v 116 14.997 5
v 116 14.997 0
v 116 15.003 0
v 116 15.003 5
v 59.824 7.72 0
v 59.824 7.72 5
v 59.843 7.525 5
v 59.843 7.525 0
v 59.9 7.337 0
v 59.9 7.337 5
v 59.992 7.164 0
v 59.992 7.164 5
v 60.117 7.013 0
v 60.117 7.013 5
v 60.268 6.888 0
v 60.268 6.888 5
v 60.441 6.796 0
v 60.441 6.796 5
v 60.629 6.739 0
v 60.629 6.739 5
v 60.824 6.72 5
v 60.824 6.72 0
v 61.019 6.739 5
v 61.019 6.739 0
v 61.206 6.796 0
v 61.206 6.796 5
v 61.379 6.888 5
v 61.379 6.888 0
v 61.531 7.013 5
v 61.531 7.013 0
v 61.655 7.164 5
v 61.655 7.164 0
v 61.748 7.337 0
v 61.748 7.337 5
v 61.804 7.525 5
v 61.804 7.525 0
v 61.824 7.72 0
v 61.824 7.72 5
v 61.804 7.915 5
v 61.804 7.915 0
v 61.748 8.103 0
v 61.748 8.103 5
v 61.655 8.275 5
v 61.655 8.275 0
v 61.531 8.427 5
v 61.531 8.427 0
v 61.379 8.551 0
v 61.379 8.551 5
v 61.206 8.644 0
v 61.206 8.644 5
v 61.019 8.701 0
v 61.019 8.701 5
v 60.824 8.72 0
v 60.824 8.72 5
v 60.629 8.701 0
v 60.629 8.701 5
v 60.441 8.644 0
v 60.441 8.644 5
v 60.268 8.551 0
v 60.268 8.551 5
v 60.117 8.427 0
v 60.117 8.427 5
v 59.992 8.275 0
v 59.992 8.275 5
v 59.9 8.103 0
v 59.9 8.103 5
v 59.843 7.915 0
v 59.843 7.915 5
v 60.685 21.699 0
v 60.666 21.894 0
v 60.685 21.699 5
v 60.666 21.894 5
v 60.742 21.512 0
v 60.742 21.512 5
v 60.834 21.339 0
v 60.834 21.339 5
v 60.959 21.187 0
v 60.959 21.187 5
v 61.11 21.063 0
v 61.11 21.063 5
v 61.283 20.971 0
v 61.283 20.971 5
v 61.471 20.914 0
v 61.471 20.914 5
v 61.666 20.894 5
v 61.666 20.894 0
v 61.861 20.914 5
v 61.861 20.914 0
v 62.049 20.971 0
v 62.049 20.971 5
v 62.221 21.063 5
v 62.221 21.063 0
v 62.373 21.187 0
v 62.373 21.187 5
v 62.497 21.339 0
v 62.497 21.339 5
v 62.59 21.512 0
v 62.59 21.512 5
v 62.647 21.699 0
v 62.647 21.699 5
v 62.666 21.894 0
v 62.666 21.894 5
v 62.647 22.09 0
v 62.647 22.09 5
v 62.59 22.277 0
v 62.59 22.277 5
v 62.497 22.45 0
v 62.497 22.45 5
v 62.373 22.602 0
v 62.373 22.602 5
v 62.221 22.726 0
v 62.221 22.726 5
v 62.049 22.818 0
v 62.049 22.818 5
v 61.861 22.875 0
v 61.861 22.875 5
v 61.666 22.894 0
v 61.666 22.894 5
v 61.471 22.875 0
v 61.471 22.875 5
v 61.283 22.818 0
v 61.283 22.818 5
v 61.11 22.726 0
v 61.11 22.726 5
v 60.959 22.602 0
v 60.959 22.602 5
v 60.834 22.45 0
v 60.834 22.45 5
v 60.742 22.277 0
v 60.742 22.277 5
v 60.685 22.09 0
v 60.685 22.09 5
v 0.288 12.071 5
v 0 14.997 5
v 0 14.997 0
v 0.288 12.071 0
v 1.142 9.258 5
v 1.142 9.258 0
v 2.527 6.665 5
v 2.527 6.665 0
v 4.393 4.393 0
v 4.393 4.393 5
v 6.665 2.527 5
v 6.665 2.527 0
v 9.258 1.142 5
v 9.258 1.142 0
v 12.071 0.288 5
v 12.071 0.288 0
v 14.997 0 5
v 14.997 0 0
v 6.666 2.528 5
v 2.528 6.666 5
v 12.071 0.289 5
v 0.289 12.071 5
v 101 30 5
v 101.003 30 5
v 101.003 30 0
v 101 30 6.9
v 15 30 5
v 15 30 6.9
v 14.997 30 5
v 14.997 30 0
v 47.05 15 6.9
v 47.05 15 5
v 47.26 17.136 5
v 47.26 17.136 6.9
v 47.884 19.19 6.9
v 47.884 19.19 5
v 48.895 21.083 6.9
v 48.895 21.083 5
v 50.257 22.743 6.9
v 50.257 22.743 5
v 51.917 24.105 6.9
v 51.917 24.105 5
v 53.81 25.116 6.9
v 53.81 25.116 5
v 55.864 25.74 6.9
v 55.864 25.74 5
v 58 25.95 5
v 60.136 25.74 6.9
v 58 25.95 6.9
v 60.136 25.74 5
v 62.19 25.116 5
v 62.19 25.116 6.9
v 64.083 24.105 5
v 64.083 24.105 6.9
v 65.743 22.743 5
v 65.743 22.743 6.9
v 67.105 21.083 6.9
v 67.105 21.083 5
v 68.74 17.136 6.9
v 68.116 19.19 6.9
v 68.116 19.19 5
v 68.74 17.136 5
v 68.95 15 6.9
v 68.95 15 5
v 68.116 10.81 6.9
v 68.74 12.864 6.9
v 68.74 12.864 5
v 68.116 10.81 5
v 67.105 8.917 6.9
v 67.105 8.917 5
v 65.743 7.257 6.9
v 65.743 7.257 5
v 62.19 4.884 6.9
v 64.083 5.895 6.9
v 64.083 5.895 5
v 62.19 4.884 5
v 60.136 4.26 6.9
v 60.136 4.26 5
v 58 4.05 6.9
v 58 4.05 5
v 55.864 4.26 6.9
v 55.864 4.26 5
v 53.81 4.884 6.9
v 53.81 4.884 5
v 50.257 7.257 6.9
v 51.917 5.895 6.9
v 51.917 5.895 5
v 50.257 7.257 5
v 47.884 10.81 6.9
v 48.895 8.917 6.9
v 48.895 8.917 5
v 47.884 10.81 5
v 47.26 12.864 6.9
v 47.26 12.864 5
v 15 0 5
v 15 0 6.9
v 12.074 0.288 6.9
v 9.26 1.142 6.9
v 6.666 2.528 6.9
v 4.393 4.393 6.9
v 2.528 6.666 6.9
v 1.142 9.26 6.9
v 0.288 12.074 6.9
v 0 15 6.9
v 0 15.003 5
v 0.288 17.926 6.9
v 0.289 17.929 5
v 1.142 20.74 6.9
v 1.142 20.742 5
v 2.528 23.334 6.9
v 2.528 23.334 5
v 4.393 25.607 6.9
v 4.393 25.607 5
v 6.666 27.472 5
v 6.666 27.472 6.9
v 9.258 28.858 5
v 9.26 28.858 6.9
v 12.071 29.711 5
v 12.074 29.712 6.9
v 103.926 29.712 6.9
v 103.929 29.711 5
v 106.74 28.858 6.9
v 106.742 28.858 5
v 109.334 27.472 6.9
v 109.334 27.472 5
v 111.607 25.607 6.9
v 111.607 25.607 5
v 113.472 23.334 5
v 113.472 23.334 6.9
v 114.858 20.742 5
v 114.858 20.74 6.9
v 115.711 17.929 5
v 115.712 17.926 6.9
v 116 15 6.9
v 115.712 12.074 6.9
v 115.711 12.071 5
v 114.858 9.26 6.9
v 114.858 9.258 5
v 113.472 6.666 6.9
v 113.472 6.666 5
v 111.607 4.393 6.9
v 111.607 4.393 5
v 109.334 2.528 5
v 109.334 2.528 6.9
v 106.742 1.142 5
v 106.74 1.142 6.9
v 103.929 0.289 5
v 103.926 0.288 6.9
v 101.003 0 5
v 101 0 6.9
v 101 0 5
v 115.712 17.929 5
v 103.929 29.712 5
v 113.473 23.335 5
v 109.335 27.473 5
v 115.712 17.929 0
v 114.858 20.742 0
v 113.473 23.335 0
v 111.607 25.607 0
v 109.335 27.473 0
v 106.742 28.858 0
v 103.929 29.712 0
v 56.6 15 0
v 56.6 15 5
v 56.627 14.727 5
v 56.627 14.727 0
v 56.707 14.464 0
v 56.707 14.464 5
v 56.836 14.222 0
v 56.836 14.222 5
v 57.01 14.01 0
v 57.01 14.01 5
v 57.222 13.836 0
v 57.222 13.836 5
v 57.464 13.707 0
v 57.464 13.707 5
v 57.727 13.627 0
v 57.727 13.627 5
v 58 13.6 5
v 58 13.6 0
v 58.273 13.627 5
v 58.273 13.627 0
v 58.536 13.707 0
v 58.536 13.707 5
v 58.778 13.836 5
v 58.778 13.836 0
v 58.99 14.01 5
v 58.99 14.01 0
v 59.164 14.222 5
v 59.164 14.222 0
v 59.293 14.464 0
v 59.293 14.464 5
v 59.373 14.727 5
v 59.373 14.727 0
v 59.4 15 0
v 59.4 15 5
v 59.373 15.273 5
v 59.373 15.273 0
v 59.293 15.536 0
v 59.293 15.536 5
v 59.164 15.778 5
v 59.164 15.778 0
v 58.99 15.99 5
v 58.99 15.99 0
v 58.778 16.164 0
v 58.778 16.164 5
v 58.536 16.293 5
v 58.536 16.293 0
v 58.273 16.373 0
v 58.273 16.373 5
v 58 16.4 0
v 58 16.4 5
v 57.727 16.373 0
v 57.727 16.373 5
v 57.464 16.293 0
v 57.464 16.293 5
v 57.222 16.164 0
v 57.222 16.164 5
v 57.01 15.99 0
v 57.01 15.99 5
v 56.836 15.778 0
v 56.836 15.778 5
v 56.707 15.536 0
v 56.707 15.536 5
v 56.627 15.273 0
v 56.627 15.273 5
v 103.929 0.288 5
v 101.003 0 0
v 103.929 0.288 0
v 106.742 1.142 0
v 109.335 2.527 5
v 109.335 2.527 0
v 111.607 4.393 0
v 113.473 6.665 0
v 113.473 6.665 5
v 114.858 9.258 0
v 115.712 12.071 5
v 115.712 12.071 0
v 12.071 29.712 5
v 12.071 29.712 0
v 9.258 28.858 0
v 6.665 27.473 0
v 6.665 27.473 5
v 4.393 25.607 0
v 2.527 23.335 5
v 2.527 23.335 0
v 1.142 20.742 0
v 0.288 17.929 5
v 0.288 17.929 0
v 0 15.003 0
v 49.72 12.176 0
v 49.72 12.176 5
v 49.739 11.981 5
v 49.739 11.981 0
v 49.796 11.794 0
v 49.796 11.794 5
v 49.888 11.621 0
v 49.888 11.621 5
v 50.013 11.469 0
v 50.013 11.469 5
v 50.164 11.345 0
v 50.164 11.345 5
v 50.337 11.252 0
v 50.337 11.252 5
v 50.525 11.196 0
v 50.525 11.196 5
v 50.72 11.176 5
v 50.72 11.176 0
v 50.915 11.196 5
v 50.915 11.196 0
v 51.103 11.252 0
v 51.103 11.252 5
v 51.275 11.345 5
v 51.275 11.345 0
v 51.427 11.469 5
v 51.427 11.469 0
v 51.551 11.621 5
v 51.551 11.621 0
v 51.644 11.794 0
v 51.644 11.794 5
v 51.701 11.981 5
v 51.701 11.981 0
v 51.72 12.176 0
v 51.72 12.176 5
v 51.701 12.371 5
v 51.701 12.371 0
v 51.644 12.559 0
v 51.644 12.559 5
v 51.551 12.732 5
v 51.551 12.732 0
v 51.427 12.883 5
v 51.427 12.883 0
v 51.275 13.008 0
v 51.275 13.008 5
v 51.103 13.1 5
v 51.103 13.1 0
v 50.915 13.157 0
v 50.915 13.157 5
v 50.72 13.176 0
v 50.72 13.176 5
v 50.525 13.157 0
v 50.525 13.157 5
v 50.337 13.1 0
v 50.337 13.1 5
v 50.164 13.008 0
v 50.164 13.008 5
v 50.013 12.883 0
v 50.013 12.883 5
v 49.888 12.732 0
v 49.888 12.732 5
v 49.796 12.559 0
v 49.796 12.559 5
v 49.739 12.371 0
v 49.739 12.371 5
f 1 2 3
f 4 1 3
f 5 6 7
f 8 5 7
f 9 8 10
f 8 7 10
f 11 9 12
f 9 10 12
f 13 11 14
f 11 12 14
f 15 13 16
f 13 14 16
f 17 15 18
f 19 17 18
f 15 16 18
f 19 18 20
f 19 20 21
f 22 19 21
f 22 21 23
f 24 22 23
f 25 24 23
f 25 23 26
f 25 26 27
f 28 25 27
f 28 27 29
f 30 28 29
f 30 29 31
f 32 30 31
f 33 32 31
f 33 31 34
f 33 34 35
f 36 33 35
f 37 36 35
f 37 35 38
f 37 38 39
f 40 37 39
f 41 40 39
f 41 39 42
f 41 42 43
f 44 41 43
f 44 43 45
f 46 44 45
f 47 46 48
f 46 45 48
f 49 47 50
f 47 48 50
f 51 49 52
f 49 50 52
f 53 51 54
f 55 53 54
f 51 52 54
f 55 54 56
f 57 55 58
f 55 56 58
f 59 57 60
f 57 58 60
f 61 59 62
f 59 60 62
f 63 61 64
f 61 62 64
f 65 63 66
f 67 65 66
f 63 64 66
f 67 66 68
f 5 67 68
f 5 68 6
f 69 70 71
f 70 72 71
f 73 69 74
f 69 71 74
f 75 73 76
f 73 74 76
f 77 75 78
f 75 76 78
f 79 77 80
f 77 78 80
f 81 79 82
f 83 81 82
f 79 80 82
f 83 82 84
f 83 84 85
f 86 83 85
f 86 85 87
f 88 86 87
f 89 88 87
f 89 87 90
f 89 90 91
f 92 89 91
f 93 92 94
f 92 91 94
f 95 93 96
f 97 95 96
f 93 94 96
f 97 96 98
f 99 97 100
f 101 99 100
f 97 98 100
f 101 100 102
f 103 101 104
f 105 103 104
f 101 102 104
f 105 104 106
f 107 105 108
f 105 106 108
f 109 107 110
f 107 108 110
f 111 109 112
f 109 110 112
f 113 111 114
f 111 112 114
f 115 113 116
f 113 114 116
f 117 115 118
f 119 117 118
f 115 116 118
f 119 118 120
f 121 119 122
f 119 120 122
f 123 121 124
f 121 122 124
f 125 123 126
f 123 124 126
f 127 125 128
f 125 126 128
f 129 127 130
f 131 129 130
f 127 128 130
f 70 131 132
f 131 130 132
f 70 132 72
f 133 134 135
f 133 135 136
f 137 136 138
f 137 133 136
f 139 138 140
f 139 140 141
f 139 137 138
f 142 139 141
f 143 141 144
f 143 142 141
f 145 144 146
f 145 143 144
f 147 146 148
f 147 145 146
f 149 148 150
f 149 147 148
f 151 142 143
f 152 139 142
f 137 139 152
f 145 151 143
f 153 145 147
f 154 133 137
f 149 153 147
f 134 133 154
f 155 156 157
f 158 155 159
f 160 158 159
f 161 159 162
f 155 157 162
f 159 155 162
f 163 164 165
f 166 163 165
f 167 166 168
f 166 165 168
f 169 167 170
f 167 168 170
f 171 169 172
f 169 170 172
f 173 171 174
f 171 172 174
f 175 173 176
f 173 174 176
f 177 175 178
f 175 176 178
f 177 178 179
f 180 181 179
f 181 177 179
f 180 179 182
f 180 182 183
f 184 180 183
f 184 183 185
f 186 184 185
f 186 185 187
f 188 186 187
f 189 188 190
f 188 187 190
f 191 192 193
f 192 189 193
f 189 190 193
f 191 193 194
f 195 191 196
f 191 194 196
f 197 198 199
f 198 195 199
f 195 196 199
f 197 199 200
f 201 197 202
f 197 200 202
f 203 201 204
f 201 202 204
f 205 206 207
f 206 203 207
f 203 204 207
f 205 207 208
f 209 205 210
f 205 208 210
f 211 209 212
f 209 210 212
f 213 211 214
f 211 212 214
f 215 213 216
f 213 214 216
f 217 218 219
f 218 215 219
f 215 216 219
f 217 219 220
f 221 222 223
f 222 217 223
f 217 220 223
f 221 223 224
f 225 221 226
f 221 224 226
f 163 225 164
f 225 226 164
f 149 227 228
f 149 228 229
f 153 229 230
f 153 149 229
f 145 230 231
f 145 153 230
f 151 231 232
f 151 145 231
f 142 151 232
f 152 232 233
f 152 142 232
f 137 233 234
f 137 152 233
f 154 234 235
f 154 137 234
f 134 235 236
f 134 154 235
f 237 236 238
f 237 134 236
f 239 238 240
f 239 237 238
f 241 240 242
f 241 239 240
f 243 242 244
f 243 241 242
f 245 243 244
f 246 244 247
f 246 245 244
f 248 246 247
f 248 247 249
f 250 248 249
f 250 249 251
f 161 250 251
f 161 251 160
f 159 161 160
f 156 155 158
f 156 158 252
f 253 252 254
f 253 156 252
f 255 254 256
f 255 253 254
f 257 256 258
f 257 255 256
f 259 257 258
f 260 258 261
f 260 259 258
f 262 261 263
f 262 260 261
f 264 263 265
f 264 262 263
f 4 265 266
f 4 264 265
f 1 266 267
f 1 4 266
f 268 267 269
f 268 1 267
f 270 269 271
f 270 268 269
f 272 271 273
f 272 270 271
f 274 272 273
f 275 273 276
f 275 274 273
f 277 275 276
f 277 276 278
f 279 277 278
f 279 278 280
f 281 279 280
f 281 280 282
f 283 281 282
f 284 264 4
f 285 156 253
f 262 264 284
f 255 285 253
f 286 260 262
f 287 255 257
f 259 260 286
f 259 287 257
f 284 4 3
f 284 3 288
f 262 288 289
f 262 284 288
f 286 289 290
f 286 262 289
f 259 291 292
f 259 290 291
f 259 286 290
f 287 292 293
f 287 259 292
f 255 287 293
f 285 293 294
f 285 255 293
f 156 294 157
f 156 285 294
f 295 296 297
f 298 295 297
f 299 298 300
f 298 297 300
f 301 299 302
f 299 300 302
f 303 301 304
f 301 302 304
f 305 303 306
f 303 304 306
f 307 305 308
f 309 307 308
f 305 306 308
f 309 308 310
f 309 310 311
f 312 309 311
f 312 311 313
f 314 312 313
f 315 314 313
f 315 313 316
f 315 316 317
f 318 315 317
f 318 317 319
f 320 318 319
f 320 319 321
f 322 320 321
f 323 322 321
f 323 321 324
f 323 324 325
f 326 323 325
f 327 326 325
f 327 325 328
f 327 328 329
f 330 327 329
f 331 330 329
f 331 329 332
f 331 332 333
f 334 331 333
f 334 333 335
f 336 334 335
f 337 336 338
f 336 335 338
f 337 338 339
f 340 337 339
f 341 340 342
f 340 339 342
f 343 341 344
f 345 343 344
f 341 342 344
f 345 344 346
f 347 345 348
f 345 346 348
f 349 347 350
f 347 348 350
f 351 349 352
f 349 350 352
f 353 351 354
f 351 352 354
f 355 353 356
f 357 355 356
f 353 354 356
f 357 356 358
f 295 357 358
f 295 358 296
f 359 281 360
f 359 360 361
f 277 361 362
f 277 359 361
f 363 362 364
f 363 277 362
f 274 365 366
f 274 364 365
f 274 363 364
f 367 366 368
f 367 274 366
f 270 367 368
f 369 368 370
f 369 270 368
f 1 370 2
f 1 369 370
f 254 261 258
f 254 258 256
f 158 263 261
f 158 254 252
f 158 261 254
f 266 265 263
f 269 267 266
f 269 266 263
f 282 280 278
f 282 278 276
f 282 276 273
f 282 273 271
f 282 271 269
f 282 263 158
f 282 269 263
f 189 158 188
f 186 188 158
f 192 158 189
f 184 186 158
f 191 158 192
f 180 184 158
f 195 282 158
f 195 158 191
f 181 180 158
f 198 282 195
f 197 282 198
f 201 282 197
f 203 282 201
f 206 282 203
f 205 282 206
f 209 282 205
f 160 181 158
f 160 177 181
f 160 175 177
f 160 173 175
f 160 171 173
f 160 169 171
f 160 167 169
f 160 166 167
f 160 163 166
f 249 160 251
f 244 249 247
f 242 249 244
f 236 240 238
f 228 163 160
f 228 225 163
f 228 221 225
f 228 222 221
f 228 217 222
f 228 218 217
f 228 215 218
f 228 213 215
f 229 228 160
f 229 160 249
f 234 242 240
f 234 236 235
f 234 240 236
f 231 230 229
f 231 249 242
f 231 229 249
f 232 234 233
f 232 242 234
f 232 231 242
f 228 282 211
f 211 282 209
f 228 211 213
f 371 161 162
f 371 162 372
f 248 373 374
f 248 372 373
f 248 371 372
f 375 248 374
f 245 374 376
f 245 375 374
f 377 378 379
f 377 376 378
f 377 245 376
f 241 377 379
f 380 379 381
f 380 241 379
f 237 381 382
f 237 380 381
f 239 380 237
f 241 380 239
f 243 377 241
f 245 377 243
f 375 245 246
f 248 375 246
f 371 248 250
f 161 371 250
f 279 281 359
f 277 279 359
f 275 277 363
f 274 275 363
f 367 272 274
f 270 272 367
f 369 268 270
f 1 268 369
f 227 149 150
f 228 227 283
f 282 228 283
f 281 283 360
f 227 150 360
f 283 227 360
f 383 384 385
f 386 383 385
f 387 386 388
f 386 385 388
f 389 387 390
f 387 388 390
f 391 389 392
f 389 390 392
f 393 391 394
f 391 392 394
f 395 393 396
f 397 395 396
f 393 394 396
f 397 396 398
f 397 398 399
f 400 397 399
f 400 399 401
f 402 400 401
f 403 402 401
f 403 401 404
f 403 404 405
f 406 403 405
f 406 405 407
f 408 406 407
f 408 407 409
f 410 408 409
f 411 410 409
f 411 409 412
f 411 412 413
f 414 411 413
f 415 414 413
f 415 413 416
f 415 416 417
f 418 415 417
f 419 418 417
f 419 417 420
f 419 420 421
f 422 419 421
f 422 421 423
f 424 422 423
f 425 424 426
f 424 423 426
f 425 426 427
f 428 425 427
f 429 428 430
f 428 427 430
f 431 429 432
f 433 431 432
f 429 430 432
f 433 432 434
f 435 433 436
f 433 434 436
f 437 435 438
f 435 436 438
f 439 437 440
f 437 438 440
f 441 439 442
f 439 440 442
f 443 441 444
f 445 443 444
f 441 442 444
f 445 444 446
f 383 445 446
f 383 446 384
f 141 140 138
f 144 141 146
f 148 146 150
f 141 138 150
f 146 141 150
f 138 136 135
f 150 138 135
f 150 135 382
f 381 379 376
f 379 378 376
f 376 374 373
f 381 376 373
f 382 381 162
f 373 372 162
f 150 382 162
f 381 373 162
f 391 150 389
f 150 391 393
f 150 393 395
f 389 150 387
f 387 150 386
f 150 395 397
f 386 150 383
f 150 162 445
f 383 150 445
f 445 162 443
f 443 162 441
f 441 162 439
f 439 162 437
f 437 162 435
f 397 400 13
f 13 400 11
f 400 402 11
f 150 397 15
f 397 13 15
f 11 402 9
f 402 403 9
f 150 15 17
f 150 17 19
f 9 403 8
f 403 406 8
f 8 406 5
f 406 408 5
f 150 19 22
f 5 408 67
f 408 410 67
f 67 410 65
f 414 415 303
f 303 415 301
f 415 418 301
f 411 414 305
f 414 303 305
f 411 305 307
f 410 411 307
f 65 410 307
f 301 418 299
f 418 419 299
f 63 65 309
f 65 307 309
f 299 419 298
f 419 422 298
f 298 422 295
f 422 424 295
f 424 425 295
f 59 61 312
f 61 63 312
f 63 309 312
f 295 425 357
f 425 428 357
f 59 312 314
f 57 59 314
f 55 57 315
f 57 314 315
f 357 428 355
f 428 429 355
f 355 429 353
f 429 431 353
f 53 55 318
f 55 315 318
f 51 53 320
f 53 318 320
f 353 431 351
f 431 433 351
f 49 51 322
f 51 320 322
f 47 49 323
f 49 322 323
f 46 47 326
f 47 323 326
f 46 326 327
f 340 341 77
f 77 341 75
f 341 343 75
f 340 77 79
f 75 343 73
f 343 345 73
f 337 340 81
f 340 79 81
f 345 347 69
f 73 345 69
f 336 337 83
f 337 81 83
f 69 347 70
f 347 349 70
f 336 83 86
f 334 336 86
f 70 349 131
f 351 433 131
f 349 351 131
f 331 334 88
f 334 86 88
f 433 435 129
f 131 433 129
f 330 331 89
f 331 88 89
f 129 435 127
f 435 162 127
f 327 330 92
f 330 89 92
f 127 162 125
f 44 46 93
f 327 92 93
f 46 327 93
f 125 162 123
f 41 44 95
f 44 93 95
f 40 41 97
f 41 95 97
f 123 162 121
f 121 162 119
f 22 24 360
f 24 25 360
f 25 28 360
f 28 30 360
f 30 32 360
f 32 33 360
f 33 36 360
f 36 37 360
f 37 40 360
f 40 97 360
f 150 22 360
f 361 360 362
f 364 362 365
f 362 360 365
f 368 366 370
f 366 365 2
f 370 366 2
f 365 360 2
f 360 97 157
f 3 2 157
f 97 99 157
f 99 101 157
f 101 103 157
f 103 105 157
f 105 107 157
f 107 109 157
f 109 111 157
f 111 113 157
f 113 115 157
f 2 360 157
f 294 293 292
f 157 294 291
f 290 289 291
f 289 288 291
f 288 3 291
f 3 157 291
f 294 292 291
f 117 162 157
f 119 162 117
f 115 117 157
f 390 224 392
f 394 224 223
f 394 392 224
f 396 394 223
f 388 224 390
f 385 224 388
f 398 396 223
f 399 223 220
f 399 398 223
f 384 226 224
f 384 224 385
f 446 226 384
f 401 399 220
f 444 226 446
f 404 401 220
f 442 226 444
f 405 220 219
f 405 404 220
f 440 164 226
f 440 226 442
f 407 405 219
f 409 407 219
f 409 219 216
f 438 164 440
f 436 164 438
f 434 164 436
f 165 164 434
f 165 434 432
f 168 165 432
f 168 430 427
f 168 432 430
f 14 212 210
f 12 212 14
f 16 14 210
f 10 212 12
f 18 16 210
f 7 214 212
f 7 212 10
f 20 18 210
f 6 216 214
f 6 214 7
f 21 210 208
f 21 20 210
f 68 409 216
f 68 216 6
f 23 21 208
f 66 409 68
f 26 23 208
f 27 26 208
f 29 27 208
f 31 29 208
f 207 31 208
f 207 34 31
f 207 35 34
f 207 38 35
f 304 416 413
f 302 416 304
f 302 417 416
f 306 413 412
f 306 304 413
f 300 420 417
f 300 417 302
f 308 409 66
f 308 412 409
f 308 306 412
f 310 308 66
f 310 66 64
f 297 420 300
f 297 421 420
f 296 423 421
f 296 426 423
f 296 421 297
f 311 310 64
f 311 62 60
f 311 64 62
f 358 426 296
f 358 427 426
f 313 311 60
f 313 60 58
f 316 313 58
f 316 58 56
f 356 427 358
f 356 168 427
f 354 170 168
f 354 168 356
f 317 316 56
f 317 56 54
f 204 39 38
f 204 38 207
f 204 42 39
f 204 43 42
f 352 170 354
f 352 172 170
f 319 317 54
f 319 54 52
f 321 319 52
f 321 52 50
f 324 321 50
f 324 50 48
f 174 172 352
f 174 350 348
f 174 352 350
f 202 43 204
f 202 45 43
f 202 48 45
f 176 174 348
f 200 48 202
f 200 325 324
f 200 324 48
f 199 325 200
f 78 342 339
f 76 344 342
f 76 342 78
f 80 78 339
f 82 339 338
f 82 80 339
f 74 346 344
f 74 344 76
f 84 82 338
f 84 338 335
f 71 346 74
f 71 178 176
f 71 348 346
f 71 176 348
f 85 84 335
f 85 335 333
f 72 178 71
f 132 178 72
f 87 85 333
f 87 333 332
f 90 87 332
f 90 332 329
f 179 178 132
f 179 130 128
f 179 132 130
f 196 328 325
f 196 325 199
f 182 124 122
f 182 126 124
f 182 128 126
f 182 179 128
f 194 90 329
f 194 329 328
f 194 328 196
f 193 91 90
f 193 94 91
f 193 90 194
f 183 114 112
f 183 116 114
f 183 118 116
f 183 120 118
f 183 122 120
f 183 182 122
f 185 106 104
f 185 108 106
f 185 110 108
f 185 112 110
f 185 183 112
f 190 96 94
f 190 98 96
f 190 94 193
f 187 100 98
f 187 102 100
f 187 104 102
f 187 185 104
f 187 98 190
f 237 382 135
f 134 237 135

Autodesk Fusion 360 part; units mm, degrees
sketch "스케치1" plane through (0, 0, 0) normal (0, 0, 1) x (1, 0, 0)
  line L0 (0, 0) -> (116, 0)
  line L1 (116, 0) -> (116, 30)
  line L2 (116, 30) -> (0, 30)
  line L3 (0, 30) -> (0, 0)
  dimension "d1" = 116
  dimension "d2" = 30
extrude "돌출1" add sketch "스케치1" along normal blind 5
fillet "필렛1" radius 15 4 edges at (0, 0, 2.5) (116, 0, 2.5) (116, 30, 2.5) (0, 30, 2.5)
sketch "스케치2" plane through (0, 0, 5) normal (0, 0, 1) x (-1, 0, 0)
  arc A0 (-15, -30) -> (-15, 0) centre (-15, -15) ccw
  line L0 (-15, 0) -> (-101, 0)
  arc A1 (-101, 0) -> (-101, -30) centre (-101, -15) ccw
  line L1 (-101, -30) -> (-15, -30)
  circle A2 centre (-58, -15) radius 10.95
  dimension "d7" = 15
  dimension "d8" = 58
  dimension "d9" = 21.9
extrude "돌출2" add sketch "스케치2" along normal blind 1.9
sketch "스케치3" plane through (0, 0, 5) normal (0, 0, 1) x (-1, 0, 0)
  circle A0 centre (-58, -15) radius 10.95
  circle A1 centre (-58, -15) radius 1.4
  circle A2 centre (-58, -15) radius 7.8085 construction
  circle A3 centre (-61.6659, -21.8945) radius 1
  circle A4 centre (-50.7199, -12.1763) radius 1
  circle A5 centre (-60.8237, -7.7199) radius 1
  line L0 (-61.6659, -21.8945) -> (-58, -15) construction
  line L1 (-58, -15) -> (-50.7199, -12.1763) construction
  line L2 (-58, -15) -> (-60.8237, -7.7199) construction
  line L3 (-58, -15) -> (-58, -25.95) construction
  dimension "d12" = 2.8
  dimension "d13" = 15.617
  dimension "d14" = 2
  dimension "d15" = 2
  dimension "d16" = 2
  dimension "d17" = 90
  dimension "d18" = 139.2
  dimension "d20" = 28
extrude "돌출3" cut sketch "스케치3" against normal blind 5 contours A1 | A3 | A4 | A5
equation "d8 = ( 116 / 2 ) * 1 mm"
